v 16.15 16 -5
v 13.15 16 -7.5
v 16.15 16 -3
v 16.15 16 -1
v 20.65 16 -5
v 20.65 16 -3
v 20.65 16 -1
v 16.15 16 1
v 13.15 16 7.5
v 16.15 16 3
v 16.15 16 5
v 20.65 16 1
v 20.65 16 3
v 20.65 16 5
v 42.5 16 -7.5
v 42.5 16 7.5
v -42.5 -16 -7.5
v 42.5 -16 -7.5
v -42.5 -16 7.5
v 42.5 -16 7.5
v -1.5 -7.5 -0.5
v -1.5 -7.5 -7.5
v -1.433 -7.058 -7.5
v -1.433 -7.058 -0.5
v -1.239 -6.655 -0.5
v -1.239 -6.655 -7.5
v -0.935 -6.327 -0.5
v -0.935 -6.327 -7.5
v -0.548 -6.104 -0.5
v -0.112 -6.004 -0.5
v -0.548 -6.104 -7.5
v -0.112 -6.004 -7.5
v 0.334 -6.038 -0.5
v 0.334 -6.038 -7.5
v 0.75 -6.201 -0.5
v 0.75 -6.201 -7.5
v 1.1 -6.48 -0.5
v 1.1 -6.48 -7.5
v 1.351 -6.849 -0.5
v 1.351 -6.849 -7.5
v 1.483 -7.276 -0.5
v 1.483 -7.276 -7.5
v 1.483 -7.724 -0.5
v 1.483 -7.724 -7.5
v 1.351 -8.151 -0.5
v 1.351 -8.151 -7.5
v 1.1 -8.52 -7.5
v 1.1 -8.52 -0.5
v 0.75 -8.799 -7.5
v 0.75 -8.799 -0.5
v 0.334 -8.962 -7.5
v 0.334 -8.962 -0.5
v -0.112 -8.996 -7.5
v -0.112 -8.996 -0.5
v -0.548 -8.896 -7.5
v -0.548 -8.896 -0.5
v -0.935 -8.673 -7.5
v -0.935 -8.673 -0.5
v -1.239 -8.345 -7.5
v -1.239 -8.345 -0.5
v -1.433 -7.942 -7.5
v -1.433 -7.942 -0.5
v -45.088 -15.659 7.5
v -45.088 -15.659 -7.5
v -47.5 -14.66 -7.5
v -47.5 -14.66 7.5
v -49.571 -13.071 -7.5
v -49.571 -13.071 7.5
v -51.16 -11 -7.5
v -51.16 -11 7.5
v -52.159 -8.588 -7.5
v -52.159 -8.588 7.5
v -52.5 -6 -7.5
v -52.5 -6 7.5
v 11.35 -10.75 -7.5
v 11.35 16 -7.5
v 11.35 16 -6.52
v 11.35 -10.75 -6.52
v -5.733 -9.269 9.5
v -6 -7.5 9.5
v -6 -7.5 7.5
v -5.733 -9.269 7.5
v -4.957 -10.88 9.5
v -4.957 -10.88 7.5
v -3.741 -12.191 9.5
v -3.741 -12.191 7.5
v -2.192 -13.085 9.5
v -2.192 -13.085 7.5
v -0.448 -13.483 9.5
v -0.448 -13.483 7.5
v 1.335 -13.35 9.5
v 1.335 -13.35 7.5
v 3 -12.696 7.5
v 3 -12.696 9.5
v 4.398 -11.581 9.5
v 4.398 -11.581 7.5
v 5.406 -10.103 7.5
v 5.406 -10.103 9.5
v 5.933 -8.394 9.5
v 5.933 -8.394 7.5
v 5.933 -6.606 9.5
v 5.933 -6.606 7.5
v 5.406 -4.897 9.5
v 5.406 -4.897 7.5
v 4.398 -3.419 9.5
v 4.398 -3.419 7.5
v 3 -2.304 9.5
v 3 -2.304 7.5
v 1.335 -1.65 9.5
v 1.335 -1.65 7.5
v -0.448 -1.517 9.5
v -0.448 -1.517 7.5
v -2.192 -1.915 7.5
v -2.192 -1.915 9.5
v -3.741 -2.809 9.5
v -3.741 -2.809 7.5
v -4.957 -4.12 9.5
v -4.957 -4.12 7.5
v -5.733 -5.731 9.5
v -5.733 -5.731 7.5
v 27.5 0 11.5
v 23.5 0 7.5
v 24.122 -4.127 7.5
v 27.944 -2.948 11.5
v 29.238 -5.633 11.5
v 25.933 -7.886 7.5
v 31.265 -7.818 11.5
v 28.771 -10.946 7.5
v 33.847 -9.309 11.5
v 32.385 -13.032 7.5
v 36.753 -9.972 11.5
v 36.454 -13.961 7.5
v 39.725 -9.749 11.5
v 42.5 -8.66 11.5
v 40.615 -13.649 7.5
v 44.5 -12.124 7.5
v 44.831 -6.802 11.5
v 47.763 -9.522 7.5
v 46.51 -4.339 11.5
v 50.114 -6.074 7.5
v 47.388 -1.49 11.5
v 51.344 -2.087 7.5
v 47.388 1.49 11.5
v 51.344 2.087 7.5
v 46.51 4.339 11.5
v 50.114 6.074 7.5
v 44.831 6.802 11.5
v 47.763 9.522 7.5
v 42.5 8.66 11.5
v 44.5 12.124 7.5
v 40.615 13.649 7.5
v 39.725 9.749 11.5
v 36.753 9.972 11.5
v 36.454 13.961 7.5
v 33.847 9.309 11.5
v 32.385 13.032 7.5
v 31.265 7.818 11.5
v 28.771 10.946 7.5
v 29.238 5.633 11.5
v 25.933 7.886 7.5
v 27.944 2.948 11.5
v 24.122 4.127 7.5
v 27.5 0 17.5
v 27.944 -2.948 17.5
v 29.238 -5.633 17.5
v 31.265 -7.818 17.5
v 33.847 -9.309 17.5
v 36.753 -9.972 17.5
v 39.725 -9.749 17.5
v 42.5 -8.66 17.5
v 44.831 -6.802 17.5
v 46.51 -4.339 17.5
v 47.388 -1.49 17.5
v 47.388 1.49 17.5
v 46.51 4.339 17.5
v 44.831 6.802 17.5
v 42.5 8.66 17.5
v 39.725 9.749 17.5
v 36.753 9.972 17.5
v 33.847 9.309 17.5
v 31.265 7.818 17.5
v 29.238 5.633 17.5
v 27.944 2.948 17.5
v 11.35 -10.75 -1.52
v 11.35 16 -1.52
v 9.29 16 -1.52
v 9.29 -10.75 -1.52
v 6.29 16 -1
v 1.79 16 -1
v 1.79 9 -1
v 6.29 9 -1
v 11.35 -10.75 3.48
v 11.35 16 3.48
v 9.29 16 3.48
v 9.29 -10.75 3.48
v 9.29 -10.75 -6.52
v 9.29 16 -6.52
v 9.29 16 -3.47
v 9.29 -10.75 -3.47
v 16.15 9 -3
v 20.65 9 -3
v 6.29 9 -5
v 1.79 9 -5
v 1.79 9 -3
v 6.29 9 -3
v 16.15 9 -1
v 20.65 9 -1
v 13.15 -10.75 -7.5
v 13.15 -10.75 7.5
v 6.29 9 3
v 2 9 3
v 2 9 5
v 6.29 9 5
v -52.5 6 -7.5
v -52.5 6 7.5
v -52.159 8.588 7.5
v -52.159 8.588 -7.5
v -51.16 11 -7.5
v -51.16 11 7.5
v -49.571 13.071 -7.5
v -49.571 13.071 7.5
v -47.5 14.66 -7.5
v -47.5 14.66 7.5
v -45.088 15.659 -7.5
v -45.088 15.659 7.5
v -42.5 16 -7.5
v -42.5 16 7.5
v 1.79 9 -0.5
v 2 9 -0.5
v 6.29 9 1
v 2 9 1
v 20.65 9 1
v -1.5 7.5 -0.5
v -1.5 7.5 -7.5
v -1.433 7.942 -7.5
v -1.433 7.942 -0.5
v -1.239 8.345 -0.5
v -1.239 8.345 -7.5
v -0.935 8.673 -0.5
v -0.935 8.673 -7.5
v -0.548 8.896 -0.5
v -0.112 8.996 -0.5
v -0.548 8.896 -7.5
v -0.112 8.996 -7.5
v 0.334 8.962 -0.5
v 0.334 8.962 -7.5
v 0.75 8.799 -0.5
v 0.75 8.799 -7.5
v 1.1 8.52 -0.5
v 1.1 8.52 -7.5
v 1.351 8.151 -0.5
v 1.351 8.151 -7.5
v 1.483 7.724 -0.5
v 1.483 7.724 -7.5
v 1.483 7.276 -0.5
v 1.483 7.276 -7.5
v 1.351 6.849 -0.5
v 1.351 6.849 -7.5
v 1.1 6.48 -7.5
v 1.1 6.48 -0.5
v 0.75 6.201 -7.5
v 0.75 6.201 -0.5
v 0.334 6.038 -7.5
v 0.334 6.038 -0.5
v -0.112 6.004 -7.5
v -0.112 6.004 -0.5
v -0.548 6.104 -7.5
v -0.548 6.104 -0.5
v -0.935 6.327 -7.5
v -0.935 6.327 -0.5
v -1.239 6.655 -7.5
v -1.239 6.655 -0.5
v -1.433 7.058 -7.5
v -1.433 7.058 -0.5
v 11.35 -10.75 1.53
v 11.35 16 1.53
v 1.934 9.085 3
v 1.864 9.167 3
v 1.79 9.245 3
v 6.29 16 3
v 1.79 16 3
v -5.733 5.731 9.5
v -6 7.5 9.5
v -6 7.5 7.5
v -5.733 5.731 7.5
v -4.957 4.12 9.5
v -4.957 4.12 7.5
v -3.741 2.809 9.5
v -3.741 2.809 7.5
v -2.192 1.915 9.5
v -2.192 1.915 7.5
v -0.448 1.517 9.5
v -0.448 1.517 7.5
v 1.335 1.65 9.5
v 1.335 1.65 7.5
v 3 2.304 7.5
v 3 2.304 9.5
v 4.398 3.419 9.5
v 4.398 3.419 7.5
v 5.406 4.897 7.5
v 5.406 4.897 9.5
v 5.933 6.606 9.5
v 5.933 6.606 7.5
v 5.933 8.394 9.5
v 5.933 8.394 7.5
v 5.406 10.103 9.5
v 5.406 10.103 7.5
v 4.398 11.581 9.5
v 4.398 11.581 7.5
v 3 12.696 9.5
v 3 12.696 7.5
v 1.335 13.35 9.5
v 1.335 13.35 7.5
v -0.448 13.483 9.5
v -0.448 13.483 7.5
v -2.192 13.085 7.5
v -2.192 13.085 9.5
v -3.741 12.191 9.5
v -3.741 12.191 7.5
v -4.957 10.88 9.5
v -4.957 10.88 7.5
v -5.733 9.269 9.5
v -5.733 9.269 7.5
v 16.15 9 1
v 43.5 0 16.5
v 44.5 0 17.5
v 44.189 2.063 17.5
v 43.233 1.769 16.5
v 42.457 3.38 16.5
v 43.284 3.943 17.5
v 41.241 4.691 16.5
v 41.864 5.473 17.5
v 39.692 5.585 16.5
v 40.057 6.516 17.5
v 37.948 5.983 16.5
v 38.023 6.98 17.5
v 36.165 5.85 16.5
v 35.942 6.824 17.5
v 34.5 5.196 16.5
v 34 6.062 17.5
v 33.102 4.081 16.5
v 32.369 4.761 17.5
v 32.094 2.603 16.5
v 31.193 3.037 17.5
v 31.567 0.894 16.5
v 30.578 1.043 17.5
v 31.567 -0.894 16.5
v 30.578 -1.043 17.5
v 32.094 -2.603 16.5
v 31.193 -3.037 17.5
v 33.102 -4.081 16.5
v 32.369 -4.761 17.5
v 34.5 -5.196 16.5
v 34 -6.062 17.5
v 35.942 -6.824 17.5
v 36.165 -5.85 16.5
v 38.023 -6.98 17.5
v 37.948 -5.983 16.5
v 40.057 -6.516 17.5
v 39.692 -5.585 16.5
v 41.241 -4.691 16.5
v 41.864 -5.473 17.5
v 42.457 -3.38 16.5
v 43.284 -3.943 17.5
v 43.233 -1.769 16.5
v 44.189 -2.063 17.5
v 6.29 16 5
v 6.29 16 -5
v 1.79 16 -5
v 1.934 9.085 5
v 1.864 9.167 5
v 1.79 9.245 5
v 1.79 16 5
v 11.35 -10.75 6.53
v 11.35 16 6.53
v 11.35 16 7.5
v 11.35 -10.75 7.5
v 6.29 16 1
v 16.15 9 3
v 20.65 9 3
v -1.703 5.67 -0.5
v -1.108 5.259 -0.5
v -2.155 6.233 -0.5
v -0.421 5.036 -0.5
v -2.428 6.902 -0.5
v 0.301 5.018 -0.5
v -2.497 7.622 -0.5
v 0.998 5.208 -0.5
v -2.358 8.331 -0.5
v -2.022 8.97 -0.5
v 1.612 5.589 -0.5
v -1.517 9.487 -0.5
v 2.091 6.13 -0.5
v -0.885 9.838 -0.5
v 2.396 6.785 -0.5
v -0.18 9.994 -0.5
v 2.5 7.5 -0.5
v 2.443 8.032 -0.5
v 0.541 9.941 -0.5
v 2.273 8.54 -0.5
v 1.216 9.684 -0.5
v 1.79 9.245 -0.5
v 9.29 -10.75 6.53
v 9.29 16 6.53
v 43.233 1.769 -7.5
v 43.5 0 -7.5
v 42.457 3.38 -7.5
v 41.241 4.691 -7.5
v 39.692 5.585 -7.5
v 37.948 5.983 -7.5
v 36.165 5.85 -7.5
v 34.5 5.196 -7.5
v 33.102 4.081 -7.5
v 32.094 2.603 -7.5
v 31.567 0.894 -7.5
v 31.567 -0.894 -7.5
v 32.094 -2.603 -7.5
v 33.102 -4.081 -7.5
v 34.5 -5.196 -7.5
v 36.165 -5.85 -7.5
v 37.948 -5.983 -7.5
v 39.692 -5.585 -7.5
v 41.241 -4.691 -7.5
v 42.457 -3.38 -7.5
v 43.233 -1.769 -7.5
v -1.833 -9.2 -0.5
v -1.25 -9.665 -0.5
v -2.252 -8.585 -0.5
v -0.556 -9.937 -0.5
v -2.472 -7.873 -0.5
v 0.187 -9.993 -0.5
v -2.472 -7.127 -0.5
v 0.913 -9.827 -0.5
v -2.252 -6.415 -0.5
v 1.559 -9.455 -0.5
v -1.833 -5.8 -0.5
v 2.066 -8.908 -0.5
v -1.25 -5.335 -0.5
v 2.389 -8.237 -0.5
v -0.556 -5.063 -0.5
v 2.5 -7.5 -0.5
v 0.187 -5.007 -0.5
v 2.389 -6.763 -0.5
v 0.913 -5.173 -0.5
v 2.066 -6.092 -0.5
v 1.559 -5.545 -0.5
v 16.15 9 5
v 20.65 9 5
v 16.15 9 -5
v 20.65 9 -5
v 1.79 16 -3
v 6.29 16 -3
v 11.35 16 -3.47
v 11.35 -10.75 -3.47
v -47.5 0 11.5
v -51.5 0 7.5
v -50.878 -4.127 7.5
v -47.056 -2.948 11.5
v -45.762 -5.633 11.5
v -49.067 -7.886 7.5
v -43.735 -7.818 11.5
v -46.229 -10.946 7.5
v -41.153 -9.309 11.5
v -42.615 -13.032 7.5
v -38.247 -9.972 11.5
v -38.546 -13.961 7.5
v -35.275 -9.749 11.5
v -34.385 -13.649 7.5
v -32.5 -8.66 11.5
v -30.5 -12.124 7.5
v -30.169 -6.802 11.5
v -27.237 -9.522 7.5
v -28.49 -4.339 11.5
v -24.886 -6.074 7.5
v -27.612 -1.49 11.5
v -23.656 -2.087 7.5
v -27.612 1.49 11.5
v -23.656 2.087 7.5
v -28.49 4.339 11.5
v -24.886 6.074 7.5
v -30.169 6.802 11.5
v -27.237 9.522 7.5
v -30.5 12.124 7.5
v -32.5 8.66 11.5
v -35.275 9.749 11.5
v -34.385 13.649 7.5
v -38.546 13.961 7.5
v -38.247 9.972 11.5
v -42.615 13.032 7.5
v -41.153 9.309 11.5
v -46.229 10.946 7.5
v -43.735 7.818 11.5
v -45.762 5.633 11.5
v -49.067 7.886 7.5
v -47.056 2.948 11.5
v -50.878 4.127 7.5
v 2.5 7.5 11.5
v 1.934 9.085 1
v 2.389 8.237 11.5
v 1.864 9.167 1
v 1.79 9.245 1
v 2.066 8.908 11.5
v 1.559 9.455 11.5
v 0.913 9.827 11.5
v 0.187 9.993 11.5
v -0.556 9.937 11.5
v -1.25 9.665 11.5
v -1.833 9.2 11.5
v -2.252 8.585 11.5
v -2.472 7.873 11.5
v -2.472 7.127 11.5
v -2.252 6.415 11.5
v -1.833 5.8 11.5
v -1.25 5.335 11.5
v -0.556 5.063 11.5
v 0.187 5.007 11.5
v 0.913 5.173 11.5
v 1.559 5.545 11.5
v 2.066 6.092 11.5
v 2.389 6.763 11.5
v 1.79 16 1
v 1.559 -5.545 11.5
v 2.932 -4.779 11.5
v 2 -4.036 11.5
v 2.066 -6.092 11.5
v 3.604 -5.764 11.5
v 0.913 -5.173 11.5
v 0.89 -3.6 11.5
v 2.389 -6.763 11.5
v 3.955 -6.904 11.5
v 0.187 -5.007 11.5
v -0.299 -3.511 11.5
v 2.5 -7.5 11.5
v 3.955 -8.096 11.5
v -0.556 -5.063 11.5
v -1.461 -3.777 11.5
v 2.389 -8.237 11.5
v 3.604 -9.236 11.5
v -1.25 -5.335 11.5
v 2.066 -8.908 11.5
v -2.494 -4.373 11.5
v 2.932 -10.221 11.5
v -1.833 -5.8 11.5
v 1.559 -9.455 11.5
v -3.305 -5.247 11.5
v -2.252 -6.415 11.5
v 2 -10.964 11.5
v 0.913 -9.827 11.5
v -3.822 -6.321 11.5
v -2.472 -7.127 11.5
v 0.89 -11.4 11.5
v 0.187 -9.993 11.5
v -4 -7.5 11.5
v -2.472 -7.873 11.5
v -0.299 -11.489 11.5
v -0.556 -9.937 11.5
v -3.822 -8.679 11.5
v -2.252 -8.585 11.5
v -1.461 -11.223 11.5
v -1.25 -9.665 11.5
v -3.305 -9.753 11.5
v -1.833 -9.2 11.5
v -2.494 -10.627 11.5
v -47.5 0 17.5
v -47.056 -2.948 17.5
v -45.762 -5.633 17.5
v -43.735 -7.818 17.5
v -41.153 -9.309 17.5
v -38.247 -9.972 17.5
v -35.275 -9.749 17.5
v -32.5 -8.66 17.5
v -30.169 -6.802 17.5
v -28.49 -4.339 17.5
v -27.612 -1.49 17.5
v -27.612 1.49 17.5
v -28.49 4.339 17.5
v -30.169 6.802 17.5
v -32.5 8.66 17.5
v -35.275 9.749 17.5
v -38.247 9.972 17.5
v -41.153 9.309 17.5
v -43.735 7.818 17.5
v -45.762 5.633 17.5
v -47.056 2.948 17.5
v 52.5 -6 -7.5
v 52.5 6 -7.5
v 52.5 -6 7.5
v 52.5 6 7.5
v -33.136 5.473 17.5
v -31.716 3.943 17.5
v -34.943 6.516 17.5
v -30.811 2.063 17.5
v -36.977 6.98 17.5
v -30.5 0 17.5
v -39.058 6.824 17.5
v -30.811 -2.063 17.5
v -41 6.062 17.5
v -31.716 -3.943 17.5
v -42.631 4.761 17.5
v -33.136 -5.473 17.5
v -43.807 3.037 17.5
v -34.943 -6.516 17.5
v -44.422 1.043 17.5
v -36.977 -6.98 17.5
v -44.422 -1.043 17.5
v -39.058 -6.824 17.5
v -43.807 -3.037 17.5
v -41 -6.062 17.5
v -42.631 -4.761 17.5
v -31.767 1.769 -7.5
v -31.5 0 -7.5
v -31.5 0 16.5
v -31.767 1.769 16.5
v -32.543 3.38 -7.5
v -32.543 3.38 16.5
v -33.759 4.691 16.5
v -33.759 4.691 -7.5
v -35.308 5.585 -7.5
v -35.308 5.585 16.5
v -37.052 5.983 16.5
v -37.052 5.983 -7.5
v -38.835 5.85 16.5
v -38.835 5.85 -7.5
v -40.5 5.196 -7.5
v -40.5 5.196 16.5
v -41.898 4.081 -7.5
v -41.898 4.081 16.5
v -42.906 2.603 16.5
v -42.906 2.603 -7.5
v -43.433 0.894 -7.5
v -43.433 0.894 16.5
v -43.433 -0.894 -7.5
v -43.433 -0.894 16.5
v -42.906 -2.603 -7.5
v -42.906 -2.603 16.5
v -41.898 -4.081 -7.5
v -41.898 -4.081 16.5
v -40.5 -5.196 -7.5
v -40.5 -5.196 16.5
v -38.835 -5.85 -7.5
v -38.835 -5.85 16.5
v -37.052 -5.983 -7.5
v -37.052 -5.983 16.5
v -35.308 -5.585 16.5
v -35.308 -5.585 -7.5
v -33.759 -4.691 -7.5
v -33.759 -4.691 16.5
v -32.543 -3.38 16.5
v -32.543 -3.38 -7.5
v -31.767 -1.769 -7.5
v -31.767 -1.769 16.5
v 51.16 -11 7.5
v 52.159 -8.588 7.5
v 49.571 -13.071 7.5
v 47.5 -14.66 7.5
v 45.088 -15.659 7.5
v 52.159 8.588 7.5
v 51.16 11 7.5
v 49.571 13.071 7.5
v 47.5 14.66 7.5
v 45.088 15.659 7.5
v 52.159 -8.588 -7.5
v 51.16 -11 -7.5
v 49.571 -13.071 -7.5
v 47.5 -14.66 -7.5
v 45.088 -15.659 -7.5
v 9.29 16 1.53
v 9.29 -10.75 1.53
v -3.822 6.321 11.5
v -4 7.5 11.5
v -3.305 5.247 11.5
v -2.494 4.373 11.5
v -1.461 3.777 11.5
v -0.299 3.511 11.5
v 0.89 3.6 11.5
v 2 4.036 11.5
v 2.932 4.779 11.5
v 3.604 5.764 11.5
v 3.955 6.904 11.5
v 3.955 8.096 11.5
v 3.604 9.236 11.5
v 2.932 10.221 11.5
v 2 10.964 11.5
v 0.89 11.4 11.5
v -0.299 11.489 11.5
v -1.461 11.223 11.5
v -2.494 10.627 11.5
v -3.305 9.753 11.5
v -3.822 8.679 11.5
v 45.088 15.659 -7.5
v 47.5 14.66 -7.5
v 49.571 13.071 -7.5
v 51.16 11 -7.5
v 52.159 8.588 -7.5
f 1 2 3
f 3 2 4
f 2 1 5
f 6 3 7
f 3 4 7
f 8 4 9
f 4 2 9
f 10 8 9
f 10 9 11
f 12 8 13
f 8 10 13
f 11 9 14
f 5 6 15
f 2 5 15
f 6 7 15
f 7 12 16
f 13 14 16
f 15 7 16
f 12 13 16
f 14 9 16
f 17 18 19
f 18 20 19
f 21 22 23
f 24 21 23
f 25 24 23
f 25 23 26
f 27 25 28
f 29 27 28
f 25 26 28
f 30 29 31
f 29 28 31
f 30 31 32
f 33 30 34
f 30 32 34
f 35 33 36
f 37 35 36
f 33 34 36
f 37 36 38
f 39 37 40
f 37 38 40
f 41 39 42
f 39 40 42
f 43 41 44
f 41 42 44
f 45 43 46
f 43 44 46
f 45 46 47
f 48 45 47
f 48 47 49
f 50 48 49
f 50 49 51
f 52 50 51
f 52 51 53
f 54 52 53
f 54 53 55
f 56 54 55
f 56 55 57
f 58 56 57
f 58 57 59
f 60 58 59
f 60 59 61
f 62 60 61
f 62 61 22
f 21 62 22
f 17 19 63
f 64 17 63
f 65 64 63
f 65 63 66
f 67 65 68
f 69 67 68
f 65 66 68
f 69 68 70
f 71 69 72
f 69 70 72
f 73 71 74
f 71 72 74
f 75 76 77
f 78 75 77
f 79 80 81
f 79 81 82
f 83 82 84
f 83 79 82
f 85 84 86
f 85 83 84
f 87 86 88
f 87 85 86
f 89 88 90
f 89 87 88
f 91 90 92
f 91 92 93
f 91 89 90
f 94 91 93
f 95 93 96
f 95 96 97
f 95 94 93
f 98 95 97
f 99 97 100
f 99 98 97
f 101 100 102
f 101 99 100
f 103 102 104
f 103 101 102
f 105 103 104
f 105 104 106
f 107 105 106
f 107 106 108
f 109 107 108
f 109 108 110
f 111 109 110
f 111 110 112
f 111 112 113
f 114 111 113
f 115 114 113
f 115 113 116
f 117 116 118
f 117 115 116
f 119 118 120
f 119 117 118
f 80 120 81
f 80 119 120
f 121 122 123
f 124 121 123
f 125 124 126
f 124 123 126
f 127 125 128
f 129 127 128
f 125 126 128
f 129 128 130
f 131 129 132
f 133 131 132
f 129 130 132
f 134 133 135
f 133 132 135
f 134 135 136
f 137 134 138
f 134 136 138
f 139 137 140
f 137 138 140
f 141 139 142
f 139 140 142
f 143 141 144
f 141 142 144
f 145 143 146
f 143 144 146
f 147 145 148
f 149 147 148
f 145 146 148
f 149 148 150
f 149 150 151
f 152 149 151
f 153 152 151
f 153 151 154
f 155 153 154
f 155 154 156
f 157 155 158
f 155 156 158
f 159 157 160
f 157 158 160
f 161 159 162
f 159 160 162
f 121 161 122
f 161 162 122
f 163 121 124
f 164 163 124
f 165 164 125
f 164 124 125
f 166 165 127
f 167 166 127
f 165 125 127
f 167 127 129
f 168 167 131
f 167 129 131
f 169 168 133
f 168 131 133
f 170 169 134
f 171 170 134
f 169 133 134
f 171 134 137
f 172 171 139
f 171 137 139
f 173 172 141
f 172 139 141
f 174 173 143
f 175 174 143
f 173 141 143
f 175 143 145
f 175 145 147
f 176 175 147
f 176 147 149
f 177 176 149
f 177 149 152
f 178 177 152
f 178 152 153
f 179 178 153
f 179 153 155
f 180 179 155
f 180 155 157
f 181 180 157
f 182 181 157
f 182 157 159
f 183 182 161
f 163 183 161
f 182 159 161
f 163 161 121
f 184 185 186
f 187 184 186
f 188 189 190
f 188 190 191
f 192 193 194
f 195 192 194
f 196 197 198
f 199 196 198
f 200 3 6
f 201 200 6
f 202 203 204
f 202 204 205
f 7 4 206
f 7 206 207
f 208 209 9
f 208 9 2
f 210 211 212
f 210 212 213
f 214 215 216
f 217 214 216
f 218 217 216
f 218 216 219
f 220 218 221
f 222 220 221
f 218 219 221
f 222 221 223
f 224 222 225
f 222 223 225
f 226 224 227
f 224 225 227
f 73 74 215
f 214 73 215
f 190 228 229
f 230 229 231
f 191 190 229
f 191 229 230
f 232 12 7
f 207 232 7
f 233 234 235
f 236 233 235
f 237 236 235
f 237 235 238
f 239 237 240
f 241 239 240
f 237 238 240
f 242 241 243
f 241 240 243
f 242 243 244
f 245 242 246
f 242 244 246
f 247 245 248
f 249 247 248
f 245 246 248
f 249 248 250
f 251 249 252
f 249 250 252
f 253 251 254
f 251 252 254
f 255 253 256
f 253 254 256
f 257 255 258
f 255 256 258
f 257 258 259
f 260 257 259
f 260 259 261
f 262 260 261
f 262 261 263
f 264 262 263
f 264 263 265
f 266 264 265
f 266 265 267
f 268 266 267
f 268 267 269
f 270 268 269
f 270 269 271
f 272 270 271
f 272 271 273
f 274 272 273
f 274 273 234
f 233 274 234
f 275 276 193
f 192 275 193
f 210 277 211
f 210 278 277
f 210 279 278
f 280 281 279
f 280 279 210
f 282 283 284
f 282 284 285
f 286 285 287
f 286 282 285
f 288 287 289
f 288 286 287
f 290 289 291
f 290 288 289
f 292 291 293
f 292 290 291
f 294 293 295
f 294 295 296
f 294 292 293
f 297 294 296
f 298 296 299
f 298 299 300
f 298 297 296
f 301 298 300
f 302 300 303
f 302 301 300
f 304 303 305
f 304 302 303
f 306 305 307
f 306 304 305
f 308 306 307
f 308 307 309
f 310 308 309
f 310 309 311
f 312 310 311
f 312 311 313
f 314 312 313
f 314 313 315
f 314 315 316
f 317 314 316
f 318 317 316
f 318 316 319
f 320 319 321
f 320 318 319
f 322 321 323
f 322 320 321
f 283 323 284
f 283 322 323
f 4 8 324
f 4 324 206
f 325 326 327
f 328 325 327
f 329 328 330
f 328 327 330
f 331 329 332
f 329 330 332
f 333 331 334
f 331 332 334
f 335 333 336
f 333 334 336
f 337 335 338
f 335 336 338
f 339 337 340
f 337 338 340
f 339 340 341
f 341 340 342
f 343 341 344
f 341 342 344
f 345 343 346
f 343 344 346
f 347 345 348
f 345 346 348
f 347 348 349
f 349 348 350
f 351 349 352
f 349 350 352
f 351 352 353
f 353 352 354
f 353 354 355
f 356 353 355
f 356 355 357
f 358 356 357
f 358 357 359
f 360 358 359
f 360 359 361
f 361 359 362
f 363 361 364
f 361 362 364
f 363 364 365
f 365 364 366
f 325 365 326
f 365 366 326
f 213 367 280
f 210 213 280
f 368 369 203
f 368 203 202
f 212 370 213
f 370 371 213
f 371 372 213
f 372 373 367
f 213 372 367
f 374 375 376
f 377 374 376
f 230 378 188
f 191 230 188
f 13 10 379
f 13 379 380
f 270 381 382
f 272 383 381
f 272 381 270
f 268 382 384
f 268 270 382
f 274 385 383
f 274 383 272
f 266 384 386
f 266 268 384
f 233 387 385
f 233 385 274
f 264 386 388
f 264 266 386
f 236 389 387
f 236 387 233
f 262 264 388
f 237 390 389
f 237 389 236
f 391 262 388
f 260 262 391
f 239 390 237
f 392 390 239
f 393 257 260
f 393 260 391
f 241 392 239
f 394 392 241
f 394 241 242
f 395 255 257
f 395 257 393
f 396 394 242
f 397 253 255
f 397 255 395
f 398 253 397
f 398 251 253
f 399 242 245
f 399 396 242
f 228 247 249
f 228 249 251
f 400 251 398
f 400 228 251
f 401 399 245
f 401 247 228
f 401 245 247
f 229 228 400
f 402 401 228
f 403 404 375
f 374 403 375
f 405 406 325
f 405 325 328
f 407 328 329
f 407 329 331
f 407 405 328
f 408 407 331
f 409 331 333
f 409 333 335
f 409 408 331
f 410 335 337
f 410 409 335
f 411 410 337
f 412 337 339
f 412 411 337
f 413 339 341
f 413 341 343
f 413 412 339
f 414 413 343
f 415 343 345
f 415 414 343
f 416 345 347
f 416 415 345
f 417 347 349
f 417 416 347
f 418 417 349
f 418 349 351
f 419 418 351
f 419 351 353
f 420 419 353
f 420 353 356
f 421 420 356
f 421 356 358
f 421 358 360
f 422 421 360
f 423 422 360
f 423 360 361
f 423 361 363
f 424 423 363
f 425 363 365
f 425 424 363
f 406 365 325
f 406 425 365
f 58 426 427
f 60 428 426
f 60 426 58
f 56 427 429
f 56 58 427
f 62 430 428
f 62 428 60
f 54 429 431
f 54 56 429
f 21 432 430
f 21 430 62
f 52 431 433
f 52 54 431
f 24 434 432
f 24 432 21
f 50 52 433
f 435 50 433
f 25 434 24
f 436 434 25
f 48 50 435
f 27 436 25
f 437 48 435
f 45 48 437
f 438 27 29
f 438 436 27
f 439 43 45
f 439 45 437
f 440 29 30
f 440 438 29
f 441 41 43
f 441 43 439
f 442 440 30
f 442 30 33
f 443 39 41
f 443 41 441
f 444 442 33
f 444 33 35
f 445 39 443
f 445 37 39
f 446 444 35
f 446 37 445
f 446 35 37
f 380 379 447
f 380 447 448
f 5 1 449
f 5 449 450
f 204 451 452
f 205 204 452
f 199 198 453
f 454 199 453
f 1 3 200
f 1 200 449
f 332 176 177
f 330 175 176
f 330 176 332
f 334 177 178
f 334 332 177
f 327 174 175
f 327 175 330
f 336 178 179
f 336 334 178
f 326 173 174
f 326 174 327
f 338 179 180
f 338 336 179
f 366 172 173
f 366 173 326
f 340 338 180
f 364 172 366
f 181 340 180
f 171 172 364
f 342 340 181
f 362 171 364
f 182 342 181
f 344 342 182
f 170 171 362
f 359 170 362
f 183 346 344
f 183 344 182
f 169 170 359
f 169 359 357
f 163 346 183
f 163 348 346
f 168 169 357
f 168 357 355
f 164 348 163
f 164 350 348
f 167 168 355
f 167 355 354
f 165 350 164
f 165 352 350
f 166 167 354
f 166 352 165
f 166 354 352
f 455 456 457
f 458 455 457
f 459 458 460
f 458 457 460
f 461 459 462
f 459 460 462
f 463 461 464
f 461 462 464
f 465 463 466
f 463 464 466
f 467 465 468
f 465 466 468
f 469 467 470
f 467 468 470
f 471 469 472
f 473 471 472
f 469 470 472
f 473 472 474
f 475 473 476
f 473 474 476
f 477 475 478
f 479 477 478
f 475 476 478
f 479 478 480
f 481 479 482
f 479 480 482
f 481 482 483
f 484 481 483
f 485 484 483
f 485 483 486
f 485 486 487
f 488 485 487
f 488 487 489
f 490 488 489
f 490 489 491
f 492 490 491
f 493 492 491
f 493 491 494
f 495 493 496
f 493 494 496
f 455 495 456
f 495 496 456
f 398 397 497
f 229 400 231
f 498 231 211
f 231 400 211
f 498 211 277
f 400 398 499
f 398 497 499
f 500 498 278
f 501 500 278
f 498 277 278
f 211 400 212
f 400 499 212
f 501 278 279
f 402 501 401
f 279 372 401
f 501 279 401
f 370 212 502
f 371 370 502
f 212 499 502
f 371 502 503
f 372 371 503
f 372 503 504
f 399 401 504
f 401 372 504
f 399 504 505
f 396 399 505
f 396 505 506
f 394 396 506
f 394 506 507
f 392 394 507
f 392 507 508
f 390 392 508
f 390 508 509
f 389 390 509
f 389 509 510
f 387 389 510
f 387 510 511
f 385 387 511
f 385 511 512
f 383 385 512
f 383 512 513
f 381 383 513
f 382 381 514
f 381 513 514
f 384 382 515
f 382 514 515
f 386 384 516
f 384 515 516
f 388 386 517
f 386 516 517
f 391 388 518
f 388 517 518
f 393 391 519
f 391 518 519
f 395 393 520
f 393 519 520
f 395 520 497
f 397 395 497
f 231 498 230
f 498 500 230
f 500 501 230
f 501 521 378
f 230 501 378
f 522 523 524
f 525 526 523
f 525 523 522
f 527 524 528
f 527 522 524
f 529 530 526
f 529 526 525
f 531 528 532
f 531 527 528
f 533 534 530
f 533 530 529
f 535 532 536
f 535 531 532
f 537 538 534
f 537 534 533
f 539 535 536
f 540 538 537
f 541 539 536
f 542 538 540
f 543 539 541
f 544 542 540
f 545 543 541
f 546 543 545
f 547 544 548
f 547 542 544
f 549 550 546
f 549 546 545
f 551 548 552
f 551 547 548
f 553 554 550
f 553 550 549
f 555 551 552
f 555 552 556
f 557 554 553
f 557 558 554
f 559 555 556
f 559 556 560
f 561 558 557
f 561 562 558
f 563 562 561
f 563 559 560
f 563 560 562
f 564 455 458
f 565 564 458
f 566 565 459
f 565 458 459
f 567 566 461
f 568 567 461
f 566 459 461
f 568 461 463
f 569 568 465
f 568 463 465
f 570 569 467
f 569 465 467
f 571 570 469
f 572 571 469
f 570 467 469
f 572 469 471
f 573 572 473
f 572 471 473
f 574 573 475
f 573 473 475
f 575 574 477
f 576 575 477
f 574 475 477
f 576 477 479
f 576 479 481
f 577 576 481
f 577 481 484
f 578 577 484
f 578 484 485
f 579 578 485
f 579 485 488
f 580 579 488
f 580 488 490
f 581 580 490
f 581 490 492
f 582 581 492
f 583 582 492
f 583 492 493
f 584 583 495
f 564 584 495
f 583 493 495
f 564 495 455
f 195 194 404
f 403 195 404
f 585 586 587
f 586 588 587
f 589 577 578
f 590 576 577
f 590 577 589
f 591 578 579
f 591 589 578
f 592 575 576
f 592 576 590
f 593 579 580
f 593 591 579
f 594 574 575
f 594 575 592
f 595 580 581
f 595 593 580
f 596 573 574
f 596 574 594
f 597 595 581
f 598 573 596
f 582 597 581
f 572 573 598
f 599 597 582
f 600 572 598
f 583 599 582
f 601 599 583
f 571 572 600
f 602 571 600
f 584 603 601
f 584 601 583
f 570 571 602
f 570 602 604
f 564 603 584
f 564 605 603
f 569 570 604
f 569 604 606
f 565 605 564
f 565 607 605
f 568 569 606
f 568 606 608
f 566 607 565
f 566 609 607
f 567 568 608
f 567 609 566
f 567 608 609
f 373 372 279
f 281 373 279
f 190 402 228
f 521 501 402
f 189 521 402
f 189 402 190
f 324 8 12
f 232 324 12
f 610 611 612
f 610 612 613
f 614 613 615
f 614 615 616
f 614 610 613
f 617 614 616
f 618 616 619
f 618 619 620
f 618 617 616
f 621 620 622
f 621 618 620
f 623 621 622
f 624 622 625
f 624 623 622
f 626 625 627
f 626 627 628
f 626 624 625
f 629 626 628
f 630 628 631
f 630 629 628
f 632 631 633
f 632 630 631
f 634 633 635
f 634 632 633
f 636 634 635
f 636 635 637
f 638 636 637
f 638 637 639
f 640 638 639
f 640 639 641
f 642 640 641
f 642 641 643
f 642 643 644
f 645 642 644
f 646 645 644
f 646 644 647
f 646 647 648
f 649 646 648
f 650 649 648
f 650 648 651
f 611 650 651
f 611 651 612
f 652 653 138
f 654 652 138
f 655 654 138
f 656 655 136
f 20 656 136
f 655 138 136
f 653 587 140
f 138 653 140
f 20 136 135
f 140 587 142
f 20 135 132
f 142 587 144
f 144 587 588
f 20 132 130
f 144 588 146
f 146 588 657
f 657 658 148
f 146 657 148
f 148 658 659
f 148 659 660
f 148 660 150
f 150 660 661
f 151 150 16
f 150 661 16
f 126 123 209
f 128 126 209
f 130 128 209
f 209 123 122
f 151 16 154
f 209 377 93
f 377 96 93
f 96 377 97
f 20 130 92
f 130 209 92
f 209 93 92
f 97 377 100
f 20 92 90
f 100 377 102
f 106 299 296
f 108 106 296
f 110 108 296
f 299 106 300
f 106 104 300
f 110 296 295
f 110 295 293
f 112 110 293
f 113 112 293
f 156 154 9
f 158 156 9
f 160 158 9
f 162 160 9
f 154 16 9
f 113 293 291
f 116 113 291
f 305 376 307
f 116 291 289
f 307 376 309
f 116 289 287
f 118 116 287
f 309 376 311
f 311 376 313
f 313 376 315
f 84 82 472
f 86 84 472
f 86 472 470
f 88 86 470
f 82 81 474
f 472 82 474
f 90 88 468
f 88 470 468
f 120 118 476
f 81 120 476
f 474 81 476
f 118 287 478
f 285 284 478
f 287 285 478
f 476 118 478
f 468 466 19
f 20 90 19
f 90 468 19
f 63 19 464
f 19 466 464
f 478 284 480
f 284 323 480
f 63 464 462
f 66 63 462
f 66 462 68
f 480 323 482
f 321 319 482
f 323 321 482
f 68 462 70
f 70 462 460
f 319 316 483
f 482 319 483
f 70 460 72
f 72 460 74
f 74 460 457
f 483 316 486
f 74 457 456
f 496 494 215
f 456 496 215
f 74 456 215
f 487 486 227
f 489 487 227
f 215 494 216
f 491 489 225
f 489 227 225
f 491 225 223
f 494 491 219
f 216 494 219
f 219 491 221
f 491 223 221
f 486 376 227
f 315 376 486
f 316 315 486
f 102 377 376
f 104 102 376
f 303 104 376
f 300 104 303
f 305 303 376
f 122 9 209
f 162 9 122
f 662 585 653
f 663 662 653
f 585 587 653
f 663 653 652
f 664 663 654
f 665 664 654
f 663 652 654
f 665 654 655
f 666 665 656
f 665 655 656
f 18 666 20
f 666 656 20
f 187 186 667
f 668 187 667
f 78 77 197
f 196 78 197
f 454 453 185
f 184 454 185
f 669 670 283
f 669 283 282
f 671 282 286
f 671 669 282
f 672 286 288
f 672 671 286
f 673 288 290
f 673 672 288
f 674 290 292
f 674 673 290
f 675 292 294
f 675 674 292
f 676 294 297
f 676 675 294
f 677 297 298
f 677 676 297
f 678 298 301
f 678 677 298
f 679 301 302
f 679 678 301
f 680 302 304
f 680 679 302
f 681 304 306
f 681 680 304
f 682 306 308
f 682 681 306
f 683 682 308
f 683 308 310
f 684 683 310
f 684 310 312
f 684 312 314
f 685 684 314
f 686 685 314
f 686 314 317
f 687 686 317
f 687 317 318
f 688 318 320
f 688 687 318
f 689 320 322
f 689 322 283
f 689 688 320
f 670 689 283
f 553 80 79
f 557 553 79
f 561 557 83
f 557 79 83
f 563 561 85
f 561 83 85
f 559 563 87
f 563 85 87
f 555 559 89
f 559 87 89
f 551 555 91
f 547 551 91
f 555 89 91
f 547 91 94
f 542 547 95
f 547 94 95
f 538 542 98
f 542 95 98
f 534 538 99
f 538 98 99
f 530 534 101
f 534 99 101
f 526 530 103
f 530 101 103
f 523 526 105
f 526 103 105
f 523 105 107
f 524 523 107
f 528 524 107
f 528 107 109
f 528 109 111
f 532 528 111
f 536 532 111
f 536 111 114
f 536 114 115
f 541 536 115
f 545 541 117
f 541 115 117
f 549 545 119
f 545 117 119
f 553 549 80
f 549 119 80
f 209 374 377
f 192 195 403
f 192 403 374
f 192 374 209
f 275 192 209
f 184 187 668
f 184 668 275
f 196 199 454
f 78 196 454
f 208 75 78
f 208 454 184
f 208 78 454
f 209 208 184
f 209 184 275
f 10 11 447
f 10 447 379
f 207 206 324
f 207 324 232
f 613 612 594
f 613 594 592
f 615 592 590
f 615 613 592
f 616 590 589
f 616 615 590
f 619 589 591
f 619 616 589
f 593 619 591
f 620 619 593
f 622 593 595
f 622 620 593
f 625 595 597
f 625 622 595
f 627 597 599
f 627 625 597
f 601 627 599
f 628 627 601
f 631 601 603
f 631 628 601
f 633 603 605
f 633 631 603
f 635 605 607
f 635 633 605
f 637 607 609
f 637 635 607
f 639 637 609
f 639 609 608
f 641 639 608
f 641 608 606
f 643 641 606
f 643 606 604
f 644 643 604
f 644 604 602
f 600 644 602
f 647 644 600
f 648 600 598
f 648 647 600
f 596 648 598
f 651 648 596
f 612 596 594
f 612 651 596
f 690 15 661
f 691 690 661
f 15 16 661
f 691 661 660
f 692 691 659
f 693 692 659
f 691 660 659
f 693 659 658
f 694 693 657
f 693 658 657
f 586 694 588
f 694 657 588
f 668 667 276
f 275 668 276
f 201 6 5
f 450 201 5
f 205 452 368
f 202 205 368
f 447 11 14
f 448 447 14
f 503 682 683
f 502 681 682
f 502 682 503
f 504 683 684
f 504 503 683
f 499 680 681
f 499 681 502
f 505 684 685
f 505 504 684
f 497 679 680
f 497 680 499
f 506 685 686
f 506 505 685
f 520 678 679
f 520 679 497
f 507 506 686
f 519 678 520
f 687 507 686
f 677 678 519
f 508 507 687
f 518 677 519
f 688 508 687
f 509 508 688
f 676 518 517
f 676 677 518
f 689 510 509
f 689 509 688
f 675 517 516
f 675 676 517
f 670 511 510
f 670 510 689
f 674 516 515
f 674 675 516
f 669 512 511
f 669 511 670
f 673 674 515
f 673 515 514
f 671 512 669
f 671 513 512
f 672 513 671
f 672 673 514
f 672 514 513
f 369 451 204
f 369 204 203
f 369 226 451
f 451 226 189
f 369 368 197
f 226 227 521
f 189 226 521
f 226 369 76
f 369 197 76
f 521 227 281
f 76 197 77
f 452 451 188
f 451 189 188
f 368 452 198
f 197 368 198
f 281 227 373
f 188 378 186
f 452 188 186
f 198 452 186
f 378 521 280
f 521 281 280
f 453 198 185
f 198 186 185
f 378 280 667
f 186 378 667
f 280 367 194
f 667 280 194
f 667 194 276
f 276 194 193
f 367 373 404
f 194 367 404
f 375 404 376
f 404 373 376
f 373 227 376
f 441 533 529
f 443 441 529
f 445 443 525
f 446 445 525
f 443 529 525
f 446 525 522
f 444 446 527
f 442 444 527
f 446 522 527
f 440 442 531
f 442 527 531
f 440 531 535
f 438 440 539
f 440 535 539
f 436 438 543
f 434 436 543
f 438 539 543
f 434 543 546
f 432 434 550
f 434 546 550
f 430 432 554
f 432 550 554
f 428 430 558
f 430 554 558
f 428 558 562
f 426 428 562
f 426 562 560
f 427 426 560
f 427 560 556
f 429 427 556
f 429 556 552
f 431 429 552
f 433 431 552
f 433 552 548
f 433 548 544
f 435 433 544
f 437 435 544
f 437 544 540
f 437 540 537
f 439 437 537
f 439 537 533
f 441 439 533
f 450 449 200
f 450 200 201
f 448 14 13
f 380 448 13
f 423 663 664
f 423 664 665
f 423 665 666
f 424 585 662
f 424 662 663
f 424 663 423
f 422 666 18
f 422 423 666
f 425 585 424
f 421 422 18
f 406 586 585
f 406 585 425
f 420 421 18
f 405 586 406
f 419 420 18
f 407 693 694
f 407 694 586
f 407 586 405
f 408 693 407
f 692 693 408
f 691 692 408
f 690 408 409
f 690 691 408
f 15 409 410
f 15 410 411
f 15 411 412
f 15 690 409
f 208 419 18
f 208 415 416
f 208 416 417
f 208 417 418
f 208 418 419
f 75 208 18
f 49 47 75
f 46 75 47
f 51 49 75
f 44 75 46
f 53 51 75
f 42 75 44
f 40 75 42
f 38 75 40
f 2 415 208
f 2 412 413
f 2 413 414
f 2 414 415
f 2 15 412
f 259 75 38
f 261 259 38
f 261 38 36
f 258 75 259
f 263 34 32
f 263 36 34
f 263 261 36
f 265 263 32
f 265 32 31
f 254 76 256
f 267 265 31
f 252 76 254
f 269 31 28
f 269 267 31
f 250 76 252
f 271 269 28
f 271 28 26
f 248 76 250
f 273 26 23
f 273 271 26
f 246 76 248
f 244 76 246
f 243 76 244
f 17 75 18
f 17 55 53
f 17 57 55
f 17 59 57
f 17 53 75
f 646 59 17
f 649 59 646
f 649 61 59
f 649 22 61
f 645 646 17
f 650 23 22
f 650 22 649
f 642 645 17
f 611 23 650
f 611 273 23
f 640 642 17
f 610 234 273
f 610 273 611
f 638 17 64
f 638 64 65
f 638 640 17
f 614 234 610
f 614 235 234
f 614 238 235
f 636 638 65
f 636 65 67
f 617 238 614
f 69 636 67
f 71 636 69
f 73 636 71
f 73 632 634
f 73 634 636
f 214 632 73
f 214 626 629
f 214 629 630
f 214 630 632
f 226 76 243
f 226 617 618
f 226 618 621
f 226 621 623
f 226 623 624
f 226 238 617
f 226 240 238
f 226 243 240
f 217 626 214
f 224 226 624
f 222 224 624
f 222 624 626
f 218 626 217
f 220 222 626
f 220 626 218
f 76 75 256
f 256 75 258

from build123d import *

# Parameters (mm, degrees)
SKETCH_1_R          = 6
EXTRUDE_1_DEPTH     = 7.5
CUT_EXTRUDE_1_DEPTH = 26.75
SKETCH_4_W          = 4.5
SKETCH_4_H          = 2
CUT_EXTRUDE_2_DEPTH = 7
SKETCH_5_R          = 10
SKETCH_5_R_2        = 6
EXTRUDE_2_DEPTH     = 10
CHAMFER_1_SIZE      = 4
CHAMFER_2_SIZE      = 1
SKETCH_6_R          = 1.5
CUT_EXTRUDE_3_DEPTH = 61.309617807
SKETCH_8_R          = 2.5
CUT_EXTRUDE_4_DEPTH = 8
EXTRUDE_START       = 4
SKETCH_9_R          = 6
SKETCH_9_R_2        = 2.5
EXTRUDE_3_DEPTH     = 4
CHAMFER_4_SIZE      = 2


with BuildPart() as part:
    # 草图1 → 凸台-拉伸1 (new, symmetric)
    with BuildSketch(Plane.XY):
        with BuildLine():
            Line((-42.5, 16), (42.5, 16))
            ThreePointArc((42.5, 16), (49.571067812, 13.071067812), (52.5, 6))
            Line((52.5, 6), (52.5, -6))
            ThreePointArc((52.5, -6), (49.571067812, -13.071067812), (42.5, -16))
            Line((42.5, -16), (-42.5, -16))
            ThreePointArc((-42.5, -16), (-49.571067812, -13.071067812), (-52.5, -6))
            Line((-52.5, -6), (-52.5, 6))
            ThreePointArc((-52.5, 6), (-49.571067812, 13.071067812), (-42.5, 16))
        make_face()
        with Locations((-37.5, 0)):
            Circle(SKETCH_1_R, mode=Mode.SUBTRACT)
        with Locations((37.5, 0)):
            Circle(SKETCH_1_R, mode=Mode.SUBTRACT)
    extrude(amount=EXTRUDE_1_DEPTH, both=True)

    # 草图2 → 切除-拉伸1 (cut)
    with BuildSketch(Plane(origin=(0, 16, 0), x_dir=(1, 0, 0), z_dir=(0, 1, 0))):
        Polygon((13.15, 7.5), (11.35, 7.5), (11.35, 6.52), (9.29, 6.52), (9.29, 3.47), (11.35, 3.47), (11.35, 1.52), (9.29, 1.52), (9.29, -1.53), (11.35, -1.53), (11.35, -3.48), (9.29, -3.48), (9.29, -6.53), (11.35, -6.53), (11.35, -7.5), (13.15, -7.5), align=None)
    extrude(amount=-CUT_EXTRUDE_1_DEPTH, mode=Mode.SUBTRACT)

    # 草图4 → 切除-拉伸2 (cut)
    with BuildSketch(Plane(origin=(0, 16, 0), x_dir=(1, 0, 0), z_dir=(0, 1, 0))):
        with Locations((4.04, 4)):
            Rectangle(SKETCH_4_W, SKETCH_4_H)
        with Locations((4.04, 0)):
            Rectangle(SKETCH_4_W, SKETCH_4_H)
        with Locations((4.04, -4)):
            Rectangle(SKETCH_4_W, SKETCH_4_H)
        with Locations((18.4, 4)):
            Rectangle(SKETCH_4_W, SKETCH_4_H)
        with Locations((18.4, 0)):
            Rectangle(SKETCH_4_W, SKETCH_4_H)
        with Locations((18.4, -4)):
            Rectangle(SKETCH_4_W, SKETCH_4_H)
    extrude(amount=-CUT_EXTRUDE_2_DEPTH, mode=Mode.SUBTRACT)

    # 草图5 → 凸台-拉伸2 (add)
    # profile 1 of 2: a face of its own
    with BuildSketch(Plane.XY.offset(7.5)):
        with Locations(Location((-37.5, 0, 0), (0, 0, 180))):
            Circle(SKETCH_5_R)
        with Locations((-37.5, 0)):
            Circle(SKETCH_5_R_2, mode=Mode.SUBTRACT)
    # profile 2 of 2: a face of its own
    with BuildSketch(Plane.XY.offset(7.5)):
        with Locations(Location((37.5, 0, 0), (0, 0, 180))):
            Circle(SKETCH_5_R)
        with Locations((37.5, 0)):
            Circle(SKETCH_5_R_2, mode=Mode.SUBTRACT)
    extrude(amount=EXTRUDE_2_DEPTH)

    # 倒角1
    chamfer_1_edges = [part.edges().sort_by_distance(p)[0] for p in [
        (-27.5, 0, 7.5),
        (47.5, 0, 7.5),
    ]]
    chamfer(chamfer_1_edges, length=CHAMFER_1_SIZE)

    # 倒角2
    chamfer_2_edges = [part.edges().sort_by_distance(p)[0] for p in [
        (-43.5, 0, 17.5),
        (31.5, 0, 17.5),
    ]]
    chamfer(chamfer_2_edges, length=CHAMFER_2_SIZE)

    # 草图6 → 切除-拉伸3 (cut, through all)
    with BuildSketch(Plane(origin=(0, 0, -7.5), x_dir=(-1, 0, 0), z_dir=(0, 0, -1))):
        with Locations((0, 7.5)):
            Circle(SKETCH_6_R)
        with Locations((0, -7.5)):
            Circle(SKETCH_6_R)
    extrude(amount=-CUT_EXTRUDE_3_DEPTH, mode=Mode.SUBTRACT)

    # 草图8 → 切除-拉伸4 (cut)
    with BuildSketch(Plane.XY.offset(7.5)):
        with Locations((0, 7.5)):
            Circle(SKETCH_8_R)
        with Locations((0, -7.5)):
            Circle(SKETCH_8_R)
    extrude(amount=-CUT_EXTRUDE_4_DEPTH, mode=Mode.SUBTRACT)

    # 草图9 → 凸台-拉伸3 (add)
    # profile 1 of 2: a face of its own
    with BuildSketch(Plane.XY.offset(7.5).offset(EXTRUDE_START)):
        with Locations(Location((0, 7.5, 0), (0, 0, 180))):
            Circle(SKETCH_9_R)
        with Locations((0, 7.5)):
            Circle(SKETCH_9_R_2, mode=Mode.SUBTRACT)
    # profile 2 of 2: a face of its own
    with BuildSketch(Plane.XY.offset(7.5).offset(EXTRUDE_START)):
        with Locations(Location((0, -7.5, 0), (0, 0, 180))):
            Circle(SKETCH_9_R)
        with Locations((0, -7.5)):
            Circle(SKETCH_9_R_2, mode=Mode.SUBTRACT)
    extrude(amount=-EXTRUDE_3_DEPTH)

    # 倒角4
    chamfer_4_edges = [part.edges().sort_by_distance(p)[0] for p in [
        (6, 7.5, 11.5),
        (6, -7.5, 11.5),
    ]]
    chamfer(chamfer_4_edges, length=CHAMFER_4_SIZE)


solid = part.part
